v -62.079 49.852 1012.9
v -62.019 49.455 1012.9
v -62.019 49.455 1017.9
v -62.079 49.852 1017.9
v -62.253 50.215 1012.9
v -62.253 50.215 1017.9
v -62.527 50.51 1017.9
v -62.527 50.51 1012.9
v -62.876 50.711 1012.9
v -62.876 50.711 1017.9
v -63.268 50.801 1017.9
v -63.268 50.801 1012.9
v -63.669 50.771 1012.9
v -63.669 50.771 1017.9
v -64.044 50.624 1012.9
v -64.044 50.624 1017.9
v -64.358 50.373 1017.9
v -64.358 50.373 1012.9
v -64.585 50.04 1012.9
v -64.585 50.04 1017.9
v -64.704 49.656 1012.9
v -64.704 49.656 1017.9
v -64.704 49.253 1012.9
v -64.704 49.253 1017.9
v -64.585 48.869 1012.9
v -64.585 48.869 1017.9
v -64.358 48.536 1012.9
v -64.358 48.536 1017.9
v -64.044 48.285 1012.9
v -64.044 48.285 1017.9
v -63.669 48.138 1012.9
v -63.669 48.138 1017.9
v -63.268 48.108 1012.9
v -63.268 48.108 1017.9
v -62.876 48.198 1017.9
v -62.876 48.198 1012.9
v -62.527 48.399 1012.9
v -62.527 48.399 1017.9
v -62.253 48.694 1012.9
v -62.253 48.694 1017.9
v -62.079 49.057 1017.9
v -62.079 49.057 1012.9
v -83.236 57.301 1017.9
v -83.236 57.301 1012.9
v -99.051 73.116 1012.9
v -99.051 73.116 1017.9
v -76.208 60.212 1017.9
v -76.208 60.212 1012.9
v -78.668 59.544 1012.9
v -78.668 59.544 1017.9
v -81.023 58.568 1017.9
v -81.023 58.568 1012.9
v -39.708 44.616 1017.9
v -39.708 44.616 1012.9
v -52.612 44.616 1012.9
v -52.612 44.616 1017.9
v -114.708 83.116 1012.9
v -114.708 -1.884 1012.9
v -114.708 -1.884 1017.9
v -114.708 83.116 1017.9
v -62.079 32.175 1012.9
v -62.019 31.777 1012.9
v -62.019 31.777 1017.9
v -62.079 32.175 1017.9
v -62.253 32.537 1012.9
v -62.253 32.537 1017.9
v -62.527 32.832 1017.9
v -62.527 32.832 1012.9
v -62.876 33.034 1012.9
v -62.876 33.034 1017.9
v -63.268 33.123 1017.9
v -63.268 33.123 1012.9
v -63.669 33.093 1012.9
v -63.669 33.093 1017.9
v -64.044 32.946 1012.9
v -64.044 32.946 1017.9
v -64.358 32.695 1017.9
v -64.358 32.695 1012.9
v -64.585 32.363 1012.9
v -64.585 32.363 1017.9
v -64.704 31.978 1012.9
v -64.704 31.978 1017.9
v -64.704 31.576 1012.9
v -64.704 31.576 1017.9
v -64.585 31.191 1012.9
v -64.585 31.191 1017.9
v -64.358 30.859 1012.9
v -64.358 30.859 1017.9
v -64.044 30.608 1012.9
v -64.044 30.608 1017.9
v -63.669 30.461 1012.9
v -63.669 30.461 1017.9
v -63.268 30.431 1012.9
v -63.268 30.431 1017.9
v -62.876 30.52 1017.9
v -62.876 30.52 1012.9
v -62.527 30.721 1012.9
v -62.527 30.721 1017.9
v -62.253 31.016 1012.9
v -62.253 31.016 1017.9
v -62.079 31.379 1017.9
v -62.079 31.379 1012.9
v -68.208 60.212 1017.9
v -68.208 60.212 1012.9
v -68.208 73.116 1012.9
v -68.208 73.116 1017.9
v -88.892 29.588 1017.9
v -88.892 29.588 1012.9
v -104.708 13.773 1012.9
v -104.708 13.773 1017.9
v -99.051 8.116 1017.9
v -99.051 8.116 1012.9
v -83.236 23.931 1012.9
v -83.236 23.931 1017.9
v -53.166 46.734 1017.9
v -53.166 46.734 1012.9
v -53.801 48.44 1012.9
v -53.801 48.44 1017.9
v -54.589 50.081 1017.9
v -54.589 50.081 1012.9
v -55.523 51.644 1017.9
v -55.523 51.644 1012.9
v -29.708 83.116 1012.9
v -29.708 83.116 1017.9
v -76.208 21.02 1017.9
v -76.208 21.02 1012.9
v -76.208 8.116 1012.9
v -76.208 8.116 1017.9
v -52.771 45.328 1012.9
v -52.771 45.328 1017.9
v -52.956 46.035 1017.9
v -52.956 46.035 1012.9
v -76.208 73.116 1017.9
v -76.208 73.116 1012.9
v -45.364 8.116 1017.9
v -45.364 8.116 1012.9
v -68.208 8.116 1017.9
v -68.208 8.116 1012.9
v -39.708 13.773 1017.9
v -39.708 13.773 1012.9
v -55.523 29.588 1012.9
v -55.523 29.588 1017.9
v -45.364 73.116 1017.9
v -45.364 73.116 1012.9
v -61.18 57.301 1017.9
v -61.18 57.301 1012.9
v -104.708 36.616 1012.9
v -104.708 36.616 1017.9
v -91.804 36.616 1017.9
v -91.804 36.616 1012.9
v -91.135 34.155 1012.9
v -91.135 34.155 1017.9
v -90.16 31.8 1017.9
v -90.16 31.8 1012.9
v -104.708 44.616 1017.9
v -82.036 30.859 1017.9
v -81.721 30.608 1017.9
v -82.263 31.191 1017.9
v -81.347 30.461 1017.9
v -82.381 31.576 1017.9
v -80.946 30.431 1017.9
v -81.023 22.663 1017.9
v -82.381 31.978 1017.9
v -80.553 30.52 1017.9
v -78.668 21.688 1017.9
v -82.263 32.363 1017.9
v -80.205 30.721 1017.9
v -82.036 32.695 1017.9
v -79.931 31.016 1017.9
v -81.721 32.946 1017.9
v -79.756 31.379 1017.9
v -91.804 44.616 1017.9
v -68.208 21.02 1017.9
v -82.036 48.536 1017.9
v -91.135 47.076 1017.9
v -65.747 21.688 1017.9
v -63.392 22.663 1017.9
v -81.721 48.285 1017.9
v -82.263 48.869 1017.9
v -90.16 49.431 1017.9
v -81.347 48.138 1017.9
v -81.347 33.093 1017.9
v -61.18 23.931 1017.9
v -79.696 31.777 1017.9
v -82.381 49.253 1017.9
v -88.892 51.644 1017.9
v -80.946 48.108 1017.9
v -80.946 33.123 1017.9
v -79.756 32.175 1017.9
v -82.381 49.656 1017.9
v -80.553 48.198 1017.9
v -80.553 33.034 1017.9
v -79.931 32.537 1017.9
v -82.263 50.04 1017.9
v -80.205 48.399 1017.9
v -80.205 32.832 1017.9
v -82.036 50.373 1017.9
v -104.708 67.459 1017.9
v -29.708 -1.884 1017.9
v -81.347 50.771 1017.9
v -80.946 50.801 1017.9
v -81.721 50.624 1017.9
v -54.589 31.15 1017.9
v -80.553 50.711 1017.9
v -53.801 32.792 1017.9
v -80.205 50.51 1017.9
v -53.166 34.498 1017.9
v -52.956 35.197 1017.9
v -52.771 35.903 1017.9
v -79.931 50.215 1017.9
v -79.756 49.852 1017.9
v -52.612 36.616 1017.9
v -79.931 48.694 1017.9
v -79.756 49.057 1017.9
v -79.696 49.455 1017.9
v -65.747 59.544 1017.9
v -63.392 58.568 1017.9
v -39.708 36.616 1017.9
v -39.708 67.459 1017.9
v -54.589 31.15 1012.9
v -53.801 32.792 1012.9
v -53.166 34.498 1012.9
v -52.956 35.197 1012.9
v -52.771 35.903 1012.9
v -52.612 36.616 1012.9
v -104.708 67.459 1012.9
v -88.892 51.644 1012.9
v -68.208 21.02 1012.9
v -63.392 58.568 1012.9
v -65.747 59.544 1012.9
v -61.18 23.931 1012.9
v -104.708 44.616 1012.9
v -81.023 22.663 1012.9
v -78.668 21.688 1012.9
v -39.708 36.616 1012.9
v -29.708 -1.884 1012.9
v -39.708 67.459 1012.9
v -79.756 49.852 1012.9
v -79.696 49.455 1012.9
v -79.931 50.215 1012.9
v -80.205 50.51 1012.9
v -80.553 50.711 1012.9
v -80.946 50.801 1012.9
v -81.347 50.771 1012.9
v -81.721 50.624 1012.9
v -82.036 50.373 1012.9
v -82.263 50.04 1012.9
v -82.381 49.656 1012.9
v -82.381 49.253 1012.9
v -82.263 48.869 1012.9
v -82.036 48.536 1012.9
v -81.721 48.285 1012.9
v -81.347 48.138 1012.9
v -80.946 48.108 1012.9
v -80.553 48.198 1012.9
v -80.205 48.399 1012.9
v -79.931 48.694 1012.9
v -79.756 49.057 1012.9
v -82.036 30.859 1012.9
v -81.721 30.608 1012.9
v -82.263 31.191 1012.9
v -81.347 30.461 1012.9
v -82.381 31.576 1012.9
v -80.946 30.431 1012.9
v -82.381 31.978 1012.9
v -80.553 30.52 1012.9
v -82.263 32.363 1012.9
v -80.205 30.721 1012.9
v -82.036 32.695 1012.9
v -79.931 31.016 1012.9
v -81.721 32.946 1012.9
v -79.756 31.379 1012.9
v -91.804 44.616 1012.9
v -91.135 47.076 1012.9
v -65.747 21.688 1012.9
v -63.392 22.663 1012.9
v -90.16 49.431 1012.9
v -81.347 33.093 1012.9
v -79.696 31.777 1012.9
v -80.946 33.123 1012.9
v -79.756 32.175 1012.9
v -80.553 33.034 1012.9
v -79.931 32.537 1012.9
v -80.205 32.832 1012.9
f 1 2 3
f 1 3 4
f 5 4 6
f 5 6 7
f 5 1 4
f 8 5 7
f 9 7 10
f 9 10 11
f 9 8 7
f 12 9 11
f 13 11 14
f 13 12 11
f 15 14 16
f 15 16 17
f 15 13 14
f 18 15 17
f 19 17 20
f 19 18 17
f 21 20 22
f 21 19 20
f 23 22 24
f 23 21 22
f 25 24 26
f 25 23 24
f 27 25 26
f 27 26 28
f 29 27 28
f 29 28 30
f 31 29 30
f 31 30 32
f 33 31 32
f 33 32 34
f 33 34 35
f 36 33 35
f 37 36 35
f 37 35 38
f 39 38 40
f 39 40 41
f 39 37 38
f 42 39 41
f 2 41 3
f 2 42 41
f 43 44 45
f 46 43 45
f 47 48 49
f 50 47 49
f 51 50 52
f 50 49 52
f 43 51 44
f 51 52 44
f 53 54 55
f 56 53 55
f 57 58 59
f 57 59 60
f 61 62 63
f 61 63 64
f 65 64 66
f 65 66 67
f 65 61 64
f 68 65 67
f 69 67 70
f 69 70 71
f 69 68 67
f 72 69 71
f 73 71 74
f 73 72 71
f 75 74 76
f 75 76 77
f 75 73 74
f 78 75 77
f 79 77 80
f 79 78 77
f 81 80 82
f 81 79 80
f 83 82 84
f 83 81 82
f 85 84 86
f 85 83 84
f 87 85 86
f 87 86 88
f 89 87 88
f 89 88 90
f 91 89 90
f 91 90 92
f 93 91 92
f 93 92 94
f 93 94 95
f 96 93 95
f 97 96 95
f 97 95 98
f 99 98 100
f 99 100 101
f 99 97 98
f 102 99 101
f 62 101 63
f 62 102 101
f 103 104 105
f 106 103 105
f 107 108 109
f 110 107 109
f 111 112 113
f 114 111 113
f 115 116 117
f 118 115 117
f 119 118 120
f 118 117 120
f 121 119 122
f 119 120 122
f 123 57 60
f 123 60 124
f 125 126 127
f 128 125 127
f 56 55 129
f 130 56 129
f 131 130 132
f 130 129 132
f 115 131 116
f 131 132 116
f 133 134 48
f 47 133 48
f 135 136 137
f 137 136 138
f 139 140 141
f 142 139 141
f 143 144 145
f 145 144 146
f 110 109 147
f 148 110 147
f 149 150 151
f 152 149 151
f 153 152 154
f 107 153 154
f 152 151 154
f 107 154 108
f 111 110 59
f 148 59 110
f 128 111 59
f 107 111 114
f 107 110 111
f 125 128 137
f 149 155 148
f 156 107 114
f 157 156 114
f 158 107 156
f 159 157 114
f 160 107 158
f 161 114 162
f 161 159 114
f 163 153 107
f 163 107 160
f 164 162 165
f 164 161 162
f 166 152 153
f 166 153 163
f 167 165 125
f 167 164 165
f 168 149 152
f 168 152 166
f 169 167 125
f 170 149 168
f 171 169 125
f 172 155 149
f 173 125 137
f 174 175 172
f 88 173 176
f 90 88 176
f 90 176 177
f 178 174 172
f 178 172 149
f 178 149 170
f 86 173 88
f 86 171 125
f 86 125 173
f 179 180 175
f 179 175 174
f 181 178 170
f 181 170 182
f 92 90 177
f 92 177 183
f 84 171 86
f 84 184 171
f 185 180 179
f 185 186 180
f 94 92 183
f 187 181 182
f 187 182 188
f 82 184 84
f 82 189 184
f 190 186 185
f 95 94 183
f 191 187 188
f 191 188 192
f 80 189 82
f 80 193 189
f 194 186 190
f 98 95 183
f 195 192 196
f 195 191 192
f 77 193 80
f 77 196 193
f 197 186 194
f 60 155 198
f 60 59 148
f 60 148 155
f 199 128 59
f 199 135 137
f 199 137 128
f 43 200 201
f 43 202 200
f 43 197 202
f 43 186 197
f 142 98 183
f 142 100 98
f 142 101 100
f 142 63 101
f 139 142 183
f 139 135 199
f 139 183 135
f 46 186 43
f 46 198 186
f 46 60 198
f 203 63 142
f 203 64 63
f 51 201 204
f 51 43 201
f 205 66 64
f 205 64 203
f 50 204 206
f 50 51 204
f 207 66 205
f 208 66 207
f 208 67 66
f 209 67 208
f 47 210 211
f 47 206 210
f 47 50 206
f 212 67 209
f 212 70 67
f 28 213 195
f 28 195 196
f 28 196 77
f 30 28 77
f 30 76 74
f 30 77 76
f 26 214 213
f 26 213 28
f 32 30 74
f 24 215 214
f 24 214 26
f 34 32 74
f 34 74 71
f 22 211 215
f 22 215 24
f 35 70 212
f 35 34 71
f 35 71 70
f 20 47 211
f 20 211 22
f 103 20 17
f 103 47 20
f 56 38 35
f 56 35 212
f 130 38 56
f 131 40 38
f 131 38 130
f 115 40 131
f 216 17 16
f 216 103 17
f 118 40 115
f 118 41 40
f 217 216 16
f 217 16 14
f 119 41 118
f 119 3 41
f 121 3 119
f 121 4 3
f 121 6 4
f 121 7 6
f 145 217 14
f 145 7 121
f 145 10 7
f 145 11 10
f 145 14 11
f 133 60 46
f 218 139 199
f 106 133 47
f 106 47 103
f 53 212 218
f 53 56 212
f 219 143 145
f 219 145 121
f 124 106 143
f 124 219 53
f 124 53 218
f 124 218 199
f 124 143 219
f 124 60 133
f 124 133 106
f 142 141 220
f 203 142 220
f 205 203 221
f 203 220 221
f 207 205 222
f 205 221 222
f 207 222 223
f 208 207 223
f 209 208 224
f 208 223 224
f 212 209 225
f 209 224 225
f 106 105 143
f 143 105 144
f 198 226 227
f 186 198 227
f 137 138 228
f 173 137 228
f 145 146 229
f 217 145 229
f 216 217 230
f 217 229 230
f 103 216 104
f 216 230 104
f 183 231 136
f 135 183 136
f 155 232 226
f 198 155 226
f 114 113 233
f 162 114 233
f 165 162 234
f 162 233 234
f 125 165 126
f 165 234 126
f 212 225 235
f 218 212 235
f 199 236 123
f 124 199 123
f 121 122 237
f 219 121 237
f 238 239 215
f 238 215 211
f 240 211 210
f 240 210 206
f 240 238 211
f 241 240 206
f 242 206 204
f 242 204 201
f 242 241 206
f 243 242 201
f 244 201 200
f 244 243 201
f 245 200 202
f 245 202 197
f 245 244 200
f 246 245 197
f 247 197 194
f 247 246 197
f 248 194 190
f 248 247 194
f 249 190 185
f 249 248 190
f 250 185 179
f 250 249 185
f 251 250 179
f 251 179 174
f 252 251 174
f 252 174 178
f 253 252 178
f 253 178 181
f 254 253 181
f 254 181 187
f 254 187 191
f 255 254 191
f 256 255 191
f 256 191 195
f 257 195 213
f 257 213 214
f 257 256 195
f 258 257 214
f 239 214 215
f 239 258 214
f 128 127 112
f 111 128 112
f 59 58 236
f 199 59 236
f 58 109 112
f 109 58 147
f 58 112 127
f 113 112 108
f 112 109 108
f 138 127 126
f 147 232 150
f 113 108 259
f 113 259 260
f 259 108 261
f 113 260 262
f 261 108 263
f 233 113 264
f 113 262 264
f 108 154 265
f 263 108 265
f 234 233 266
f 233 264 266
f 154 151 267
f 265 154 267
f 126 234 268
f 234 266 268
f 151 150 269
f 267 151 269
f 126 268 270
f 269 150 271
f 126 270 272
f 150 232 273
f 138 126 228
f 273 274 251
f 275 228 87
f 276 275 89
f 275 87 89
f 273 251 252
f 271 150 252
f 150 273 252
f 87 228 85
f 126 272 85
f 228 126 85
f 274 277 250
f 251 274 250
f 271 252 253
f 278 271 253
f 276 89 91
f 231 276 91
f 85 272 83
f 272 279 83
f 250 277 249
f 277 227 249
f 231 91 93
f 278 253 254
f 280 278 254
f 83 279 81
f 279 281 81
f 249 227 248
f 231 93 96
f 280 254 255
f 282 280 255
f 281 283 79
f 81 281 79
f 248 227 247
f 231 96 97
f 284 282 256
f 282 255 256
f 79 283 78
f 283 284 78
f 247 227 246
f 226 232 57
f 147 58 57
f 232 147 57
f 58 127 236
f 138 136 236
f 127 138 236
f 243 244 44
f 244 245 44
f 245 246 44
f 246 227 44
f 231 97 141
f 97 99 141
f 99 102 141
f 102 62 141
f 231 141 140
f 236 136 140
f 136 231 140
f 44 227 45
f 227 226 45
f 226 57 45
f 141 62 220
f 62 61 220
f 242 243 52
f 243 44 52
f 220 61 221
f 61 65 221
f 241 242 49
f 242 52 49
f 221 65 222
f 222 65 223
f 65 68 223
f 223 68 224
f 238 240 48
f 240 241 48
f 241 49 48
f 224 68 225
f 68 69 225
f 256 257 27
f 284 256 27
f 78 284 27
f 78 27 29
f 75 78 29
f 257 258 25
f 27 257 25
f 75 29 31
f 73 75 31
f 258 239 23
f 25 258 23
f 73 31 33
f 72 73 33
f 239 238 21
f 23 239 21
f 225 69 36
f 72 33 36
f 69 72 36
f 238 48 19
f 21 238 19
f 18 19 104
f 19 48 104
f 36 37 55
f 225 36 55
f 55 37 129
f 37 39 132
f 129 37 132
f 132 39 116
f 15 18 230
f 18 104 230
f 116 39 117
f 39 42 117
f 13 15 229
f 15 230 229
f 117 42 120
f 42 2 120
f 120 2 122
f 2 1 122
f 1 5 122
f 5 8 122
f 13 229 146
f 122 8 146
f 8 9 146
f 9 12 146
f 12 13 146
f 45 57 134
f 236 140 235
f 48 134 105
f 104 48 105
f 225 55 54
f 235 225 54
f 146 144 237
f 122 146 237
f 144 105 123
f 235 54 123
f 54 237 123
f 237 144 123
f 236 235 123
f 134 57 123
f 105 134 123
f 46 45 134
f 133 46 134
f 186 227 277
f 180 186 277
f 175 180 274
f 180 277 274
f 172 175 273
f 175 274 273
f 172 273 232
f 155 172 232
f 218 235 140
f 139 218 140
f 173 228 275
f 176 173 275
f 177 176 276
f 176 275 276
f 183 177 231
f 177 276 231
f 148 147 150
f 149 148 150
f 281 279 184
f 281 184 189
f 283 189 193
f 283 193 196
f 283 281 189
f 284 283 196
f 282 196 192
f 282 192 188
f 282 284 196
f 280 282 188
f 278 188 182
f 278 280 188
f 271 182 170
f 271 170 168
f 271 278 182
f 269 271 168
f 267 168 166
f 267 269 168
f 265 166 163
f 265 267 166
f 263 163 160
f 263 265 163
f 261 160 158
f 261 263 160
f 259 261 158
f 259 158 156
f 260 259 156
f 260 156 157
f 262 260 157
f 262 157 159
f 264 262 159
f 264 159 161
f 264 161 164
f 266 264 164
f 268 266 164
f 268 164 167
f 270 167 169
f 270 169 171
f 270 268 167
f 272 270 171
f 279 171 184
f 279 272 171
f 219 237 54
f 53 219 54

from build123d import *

# Parameters (mm, degrees)
CROQUIS1_W              = 85
CROQUIS1_H              = 85
CROQUIS1_R              = 1.35
SALIENTE_EXTRUIR1_DEPTH = 5


with BuildPart() as part:
    # Croquis1 → Saliente-Extruir1 (new body)
    with BuildSketch(Plane.XY.offset(1012.9)):
        with Locations((-72.207592574, 40.615670498)):
            Rectangle(CROQUIS1_W, CROQUIS1_H)
        with BuildLine():
            Line((-99.050738324, 73.115670498), (-76.207592574, 73.115670498))
            Line((-76.207592574, 73.115670498), (-76.207592574, 60.21158844))
            ThreePointArc((-76.207592574, 60.21158844), (-79.861261221, 59.093261148), (-83.23557191, 57.300504083))
            Line((-83.23557191, 57.300504083), (-99.050738324, 73.115670498))
        make_face(mode=Mode.SUBTRACT)
        with BuildLine():
            Line((-104.707592574, 67.458816249), (-88.892426159, 51.643649834))
            ThreePointArc((-88.892426159, 51.643649834), (-90.685183224, 48.269339145), (-91.803510516, 44.615670498))
            Line((-91.803510516, 44.615670498), (-104.707592574, 44.615670498))
            Line((-104.707592574, 44.615670498), (-104.707592574, 67.458816249))
        make_face(mode=Mode.SUBTRACT)
        with BuildLine():
            Line((-104.707592574, 36.615670498), (-91.803510516, 36.615670498))
            ThreePointArc((-91.803510516, 36.615670498), (-90.685183224, 32.962001851), (-88.892426159, 29.587691162))
            Line((-88.892426159, 29.587691162), (-104.707592574, 13.772524748))
            Line((-104.707592574, 13.772524748), (-104.707592574, 36.615670498))
        make_face(mode=Mode.SUBTRACT)
        with BuildLine():
            Line((-99.050738324, 8.115670498), (-83.23557191, 23.930836913))
            ThreePointArc((-83.23557191, 23.930836913), (-79.861261221, 22.138079848), (-76.207592574, 21.019752556))
            Line((-76.207592574, 21.019752556), (-76.207592574, 8.115670498))
            Line((-76.207592574, 8.115670498), (-99.050738324, 8.115670498))
        make_face(mode=Mode.SUBTRACT)
        with BuildLine():
            Line((-68.207592574, 8.115670498), (-68.207592574, 21.019752556))
            ThreePointArc((-68.207592574, 21.019752556), (-64.553923927, 22.138079848), (-61.179613238, 23.930836913))
            Line((-61.179613238, 23.930836913), (-45.364446823, 8.115670498))
            Line((-45.364446823, 8.115670498), (-68.207592574, 8.115670498))
        make_face(mode=Mode.SUBTRACT)
        with BuildLine():
            Line((-39.707592574, 13.772524748), (-55.522758989, 29.587691162))
            ThreePointArc((-55.522758989, 29.587691162), (-53.730001924, 32.962001851), (-52.611674632, 36.615670498))
            Line((-52.611674632, 36.615670498), (-39.707592574, 36.615670498))
            Line((-39.707592574, 36.615670498), (-39.707592574, 13.772524748))
        make_face(mode=Mode.SUBTRACT)
        with BuildLine():
            ThreePointArc((-52.611674632, 44.615670498), (-53.730001924, 48.269339145), (-55.522758989, 51.643649834))
            Line((-55.522758989, 51.643649834), (-39.707592574, 67.458816249))
            Line((-39.707592574, 67.458816249), (-39.707592574, 44.615670498))
            Line((-39.707592574, 44.615670498), (-52.611674632, 44.615670498))
        make_face(mode=Mode.SUBTRACT)
        with BuildLine():
            Line((-45.364446823, 73.115670498), (-61.179613238, 57.300504083))
            ThreePointArc((-61.179613238, 57.300504083), (-64.553923927, 59.093261148), (-68.207592574, 60.21158844))
            Line((-68.207592574, 60.21158844), (-68.207592574, 73.115670498))
            Line((-68.207592574, 73.115670498), (-45.364446823, 73.115670498))
        make_face(mode=Mode.SUBTRACT)
        with Locations((-63.368757809, 49.454505263)):
            Circle(CROQUIS1_R, mode=Mode.SUBTRACT)
        with Locations((-81.046427339, 31.776835733)):
            Circle(CROQUIS1_R, mode=Mode.SUBTRACT)
        with Locations((-63.368757809, 31.776835733)):
            Circle(CROQUIS1_R, mode=Mode.SUBTRACT)
        with Locations((-81.046427339, 49.454505263)):
            Circle(CROQUIS1_R, mode=Mode.SUBTRACT)
    extrude(amount=SALIENTE_EXTRUIR1_DEPTH)


solid = part.part
